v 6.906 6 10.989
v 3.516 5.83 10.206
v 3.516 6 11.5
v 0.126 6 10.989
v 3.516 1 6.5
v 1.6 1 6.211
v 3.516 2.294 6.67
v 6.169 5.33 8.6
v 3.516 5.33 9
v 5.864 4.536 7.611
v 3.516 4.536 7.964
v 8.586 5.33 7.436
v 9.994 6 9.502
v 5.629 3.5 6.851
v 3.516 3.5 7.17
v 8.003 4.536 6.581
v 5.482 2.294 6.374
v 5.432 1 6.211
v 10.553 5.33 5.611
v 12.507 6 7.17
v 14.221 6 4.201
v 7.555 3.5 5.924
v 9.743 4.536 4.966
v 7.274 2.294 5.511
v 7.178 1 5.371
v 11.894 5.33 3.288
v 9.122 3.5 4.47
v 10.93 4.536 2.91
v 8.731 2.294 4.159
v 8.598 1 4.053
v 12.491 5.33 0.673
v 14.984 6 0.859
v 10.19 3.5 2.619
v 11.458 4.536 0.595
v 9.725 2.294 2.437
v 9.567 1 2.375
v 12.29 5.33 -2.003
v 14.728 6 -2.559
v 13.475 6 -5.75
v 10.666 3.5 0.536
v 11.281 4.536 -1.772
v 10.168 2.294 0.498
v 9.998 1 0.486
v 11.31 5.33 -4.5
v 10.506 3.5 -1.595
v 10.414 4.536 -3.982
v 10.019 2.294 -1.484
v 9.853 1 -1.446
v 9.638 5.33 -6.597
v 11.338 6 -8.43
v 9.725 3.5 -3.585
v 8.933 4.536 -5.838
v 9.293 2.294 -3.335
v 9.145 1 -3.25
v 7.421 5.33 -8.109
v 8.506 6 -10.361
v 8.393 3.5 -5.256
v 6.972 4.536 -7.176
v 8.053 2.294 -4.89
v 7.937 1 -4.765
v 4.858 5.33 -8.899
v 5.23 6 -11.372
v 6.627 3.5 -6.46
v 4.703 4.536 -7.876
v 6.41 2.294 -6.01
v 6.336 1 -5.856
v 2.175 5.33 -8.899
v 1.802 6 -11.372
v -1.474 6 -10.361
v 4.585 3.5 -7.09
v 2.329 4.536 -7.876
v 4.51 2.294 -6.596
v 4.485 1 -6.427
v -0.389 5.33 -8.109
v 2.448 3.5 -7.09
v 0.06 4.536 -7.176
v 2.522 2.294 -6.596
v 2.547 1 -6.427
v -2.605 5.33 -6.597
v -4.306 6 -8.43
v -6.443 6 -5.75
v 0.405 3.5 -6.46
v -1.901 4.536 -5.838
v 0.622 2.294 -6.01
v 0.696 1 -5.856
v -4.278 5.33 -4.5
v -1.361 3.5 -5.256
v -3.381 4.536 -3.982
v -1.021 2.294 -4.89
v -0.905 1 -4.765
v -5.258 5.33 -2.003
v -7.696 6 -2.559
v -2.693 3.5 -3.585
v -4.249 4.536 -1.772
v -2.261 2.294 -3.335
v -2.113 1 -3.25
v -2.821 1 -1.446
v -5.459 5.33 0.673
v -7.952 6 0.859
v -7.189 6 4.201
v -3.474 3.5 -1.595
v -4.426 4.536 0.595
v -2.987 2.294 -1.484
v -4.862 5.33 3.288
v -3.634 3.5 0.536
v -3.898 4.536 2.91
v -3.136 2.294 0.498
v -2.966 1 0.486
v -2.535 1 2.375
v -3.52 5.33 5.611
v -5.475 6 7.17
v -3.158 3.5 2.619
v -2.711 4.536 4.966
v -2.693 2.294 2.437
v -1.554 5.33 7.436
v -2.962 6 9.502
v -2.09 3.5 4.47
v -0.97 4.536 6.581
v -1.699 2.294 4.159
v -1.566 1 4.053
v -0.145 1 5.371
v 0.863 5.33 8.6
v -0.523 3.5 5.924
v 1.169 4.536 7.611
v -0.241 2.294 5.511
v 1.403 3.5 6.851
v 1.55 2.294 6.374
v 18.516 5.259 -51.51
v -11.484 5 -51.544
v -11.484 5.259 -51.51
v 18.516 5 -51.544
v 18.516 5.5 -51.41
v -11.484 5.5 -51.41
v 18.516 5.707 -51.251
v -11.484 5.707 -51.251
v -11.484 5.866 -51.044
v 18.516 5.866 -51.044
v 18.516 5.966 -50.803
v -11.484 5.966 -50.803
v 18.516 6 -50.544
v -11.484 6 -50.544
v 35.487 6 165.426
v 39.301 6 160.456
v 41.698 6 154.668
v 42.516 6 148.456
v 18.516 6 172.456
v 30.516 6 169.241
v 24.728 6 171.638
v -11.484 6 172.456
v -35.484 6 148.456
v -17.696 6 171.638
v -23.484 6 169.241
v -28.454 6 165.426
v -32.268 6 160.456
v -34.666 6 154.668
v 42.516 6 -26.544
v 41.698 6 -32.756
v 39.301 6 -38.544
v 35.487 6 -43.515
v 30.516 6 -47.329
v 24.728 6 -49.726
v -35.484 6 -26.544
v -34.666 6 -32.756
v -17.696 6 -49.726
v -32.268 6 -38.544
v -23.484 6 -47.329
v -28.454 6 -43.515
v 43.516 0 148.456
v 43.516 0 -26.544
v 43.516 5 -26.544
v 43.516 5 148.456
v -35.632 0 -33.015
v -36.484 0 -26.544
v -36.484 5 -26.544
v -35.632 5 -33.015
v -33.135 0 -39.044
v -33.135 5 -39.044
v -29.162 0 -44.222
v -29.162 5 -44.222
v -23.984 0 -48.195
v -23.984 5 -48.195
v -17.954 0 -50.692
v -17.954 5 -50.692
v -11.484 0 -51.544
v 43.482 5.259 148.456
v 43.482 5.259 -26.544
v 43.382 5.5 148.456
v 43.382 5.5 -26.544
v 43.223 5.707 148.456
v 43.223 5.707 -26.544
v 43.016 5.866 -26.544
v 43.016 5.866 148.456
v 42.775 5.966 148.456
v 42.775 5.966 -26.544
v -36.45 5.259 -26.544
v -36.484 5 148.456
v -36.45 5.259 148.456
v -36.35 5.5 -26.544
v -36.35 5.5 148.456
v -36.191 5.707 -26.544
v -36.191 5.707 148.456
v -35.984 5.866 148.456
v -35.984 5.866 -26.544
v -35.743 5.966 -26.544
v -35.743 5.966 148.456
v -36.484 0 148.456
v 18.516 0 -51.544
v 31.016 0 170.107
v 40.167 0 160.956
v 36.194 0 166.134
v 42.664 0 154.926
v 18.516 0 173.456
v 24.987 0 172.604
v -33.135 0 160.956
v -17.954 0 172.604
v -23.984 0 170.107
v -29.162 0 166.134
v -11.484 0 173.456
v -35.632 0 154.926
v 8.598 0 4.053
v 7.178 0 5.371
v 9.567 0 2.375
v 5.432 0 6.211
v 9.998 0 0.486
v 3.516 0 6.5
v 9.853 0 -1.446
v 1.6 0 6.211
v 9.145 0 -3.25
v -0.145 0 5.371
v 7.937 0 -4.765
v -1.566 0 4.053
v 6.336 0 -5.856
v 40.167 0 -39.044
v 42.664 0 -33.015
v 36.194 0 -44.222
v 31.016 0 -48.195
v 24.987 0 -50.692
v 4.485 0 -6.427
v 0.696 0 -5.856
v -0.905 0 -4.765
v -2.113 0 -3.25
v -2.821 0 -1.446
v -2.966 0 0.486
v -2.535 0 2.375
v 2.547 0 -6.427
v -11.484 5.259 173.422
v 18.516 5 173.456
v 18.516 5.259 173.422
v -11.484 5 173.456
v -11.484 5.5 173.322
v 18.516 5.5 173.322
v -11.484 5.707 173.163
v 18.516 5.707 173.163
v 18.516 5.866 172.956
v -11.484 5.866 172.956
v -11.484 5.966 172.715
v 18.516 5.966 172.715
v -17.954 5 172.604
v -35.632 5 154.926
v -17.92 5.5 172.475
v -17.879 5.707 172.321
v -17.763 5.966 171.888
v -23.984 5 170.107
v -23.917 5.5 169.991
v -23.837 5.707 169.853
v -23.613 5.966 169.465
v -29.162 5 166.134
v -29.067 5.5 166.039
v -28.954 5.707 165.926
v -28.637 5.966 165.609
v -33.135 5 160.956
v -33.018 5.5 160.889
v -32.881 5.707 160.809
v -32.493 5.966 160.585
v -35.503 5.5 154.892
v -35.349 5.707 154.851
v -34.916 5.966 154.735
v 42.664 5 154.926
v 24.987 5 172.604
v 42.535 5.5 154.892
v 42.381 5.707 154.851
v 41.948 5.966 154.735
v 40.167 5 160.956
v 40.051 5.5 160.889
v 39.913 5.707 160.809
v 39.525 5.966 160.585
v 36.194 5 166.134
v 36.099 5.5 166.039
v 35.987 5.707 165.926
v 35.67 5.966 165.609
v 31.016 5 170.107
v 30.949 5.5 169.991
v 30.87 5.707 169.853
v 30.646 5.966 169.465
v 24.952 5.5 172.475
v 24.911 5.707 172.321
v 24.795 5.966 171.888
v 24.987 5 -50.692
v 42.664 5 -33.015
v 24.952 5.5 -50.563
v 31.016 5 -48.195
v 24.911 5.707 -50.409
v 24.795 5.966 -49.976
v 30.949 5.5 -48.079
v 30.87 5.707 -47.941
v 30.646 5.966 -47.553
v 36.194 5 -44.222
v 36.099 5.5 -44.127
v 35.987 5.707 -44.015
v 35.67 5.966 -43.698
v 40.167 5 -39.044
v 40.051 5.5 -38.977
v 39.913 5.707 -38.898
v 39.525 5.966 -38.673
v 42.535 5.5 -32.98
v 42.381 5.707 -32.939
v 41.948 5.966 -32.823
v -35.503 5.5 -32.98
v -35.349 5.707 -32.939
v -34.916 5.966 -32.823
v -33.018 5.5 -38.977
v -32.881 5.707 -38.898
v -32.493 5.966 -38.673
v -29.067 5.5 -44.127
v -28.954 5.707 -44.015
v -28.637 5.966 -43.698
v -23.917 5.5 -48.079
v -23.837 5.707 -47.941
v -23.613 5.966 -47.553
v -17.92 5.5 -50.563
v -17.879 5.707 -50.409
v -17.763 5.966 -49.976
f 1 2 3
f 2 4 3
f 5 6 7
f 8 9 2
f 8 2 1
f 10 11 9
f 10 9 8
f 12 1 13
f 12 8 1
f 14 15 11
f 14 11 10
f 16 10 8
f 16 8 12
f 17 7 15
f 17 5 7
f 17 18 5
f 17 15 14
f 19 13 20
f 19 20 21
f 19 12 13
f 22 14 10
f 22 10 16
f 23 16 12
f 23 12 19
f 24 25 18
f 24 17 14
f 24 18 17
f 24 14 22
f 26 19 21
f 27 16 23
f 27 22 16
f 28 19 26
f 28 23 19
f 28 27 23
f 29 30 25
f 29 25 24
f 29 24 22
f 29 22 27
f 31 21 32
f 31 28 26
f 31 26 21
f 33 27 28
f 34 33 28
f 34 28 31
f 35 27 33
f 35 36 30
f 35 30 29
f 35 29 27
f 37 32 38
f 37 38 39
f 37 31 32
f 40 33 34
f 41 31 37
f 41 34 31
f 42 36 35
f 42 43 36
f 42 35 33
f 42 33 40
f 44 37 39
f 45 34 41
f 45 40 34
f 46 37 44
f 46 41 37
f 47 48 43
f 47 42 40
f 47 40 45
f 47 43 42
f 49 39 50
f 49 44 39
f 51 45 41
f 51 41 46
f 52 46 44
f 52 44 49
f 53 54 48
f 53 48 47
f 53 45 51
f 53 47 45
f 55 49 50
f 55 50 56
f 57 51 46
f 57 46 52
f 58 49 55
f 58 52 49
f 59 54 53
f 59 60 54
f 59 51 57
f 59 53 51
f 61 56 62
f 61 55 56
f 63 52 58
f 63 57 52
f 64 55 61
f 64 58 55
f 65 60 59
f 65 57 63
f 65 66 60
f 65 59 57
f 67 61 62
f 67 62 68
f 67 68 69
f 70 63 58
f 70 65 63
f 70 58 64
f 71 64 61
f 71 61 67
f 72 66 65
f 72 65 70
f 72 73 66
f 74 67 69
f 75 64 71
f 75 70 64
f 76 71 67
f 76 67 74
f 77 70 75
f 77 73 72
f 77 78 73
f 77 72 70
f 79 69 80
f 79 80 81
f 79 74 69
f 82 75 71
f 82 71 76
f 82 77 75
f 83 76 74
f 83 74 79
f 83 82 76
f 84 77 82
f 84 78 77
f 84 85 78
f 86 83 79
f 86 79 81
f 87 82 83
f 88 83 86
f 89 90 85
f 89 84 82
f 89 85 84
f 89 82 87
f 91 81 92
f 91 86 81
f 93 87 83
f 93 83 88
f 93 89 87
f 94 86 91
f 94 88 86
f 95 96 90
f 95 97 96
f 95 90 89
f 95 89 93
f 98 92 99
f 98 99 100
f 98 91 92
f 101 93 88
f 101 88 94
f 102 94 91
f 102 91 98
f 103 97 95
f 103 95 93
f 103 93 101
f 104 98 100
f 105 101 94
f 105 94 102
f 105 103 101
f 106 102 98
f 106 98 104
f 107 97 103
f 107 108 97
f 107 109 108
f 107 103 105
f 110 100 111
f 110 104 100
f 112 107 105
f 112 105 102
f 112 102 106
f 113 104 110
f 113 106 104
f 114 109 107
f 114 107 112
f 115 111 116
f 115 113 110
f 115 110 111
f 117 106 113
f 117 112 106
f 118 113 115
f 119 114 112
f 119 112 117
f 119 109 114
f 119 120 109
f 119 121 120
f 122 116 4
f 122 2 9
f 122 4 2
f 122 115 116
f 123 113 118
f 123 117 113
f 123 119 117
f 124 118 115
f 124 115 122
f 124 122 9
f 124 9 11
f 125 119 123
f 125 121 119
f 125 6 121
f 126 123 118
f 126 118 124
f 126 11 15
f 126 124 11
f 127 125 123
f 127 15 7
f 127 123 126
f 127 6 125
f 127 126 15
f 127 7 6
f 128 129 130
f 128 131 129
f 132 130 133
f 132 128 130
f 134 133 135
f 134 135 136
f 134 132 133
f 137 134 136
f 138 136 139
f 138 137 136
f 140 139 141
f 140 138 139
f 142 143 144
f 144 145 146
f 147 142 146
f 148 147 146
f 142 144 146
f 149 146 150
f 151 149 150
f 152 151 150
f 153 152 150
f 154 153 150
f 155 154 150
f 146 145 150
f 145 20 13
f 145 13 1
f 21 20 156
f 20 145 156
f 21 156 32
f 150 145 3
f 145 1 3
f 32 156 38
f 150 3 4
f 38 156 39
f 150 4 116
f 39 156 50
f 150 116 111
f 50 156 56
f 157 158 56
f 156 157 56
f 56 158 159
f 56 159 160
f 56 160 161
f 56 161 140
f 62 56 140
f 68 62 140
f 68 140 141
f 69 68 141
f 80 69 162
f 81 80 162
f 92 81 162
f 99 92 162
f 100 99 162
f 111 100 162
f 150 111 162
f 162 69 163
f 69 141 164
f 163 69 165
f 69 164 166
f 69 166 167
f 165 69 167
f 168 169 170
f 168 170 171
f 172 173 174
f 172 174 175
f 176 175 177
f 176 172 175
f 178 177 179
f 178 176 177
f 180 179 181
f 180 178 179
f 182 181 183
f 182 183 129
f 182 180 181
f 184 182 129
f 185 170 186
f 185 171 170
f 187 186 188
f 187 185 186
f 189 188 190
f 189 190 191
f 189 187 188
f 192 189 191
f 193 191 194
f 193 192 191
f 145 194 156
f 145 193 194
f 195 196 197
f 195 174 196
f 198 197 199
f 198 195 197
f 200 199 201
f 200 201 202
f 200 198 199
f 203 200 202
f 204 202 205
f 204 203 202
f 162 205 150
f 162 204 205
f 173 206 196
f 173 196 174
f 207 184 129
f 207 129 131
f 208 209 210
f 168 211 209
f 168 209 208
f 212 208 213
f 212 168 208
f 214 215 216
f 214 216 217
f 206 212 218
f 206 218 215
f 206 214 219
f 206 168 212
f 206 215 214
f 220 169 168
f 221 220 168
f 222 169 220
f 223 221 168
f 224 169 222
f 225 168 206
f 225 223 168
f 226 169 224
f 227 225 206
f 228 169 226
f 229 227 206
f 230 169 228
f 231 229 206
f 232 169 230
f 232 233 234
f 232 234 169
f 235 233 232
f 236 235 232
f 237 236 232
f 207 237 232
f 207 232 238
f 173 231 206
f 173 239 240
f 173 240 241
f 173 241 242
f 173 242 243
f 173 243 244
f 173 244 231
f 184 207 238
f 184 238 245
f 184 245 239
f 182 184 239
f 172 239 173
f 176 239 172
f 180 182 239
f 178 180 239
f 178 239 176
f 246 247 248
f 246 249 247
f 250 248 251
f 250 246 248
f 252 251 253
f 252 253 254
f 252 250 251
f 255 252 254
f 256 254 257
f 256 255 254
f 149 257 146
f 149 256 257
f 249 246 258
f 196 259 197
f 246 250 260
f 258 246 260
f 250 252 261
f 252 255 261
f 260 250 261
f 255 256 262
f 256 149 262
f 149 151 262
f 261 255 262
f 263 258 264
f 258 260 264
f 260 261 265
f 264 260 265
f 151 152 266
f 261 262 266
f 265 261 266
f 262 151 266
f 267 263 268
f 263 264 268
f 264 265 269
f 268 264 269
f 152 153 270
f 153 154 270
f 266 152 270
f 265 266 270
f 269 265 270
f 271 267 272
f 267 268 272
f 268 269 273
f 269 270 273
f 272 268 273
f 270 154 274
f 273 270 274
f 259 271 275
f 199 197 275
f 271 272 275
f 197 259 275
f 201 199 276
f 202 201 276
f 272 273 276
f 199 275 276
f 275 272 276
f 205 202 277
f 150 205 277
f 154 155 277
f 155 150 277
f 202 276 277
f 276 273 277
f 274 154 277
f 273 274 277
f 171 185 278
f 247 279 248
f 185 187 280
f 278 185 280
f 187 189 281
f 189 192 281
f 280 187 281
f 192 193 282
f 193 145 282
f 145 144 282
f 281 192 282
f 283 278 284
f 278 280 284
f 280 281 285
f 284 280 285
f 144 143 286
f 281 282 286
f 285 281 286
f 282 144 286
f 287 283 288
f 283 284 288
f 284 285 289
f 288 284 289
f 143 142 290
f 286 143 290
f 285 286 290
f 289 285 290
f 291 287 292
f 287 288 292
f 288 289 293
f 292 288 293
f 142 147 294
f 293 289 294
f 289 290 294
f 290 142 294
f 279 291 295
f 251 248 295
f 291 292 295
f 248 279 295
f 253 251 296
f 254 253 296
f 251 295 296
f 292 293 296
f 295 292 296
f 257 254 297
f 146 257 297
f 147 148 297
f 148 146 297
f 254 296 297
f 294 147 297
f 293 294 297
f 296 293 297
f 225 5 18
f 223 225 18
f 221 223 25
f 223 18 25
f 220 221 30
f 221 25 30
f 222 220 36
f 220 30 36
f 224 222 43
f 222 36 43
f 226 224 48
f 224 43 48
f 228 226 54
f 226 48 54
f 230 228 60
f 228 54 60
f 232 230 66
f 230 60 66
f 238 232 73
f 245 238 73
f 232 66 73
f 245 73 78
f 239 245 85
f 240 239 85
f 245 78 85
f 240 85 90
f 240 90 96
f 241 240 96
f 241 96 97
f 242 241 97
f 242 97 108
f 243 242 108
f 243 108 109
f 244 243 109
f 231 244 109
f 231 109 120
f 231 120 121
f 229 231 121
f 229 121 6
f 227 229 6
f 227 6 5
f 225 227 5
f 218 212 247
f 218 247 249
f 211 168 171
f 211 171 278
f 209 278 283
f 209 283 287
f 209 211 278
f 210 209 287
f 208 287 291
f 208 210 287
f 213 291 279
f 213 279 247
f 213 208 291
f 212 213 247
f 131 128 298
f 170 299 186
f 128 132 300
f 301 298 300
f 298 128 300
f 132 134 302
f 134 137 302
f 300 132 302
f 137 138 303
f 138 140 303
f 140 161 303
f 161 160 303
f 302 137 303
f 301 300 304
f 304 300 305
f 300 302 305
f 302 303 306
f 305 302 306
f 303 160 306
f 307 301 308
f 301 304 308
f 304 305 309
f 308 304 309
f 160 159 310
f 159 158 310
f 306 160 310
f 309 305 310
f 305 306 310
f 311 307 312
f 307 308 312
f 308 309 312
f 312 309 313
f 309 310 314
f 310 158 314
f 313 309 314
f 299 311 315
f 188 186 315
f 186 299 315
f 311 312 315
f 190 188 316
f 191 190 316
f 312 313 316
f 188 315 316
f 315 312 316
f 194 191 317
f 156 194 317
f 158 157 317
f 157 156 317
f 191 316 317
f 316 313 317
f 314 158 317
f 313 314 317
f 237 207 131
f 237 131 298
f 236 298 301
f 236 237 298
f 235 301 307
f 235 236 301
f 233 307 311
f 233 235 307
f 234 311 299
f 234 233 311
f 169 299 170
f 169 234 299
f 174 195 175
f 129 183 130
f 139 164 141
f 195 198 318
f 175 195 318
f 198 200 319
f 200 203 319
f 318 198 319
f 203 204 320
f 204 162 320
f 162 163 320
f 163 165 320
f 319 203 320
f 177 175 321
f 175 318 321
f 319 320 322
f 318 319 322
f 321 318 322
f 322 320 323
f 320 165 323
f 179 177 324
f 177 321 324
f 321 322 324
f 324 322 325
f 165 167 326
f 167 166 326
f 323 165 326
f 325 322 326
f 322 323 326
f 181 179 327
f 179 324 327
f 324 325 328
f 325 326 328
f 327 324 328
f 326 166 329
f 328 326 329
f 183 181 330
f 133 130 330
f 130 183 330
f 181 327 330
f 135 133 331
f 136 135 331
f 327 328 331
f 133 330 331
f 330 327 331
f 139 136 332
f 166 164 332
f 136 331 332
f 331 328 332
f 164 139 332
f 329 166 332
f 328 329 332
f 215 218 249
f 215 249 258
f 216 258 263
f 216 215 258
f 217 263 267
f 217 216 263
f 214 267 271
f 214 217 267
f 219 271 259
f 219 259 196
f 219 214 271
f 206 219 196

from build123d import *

# Parameters (mm, degrees)
EXTRUDE_1_DEPTH     = 6
FILLET_1_R          = 1
SKETCH_2_R          = 6.5
CUT_EXTRUDE_1_DEPTH = 179.931854445
FILLET_2_R          = 5


with BuildPart() as part:
    # 草图1 → 凸台-拉伸1 (new body)
    with BuildSketch(Plane(origin=(0, 0, 0), x_dir=(1, 0, 0), z_dir=(0, 1, 0))):
        with BuildLine():
            Line((-11.483876828, 51.544081798), (18.516123172, 51.544081798))
            ThreePointArc((18.516123172, 51.544081798), (36.193792702, 44.221751328), (43.516123172, 26.544081798))
            Line((43.516123172, 26.544081798), (43.516123172, -148.455918202))
            ThreePointArc((43.516123172, -148.455918202), (36.193792702, -166.133587732), (18.516123172, -173.455918202))
            Line((18.516123172, -173.455918202), (-11.483876828, -173.455918202))
            ThreePointArc((-11.483876828, -173.455918202), (-29.161546358, -166.133587732), (-36.483876828, -148.455918202))
            Line((-36.483876828, -148.455918202), (-36.483876828, 26.544081798))
            ThreePointArc((-36.483876828, 26.544081798), (-29.161546358, 44.221751328), (-11.483876828, 51.544081798))
        make_face()
    extrude(amount=EXTRUDE_1_DEPTH)

    # 圆角1
    fillet_1_edges = [part.edges().sort_by_distance(p)[0] for p in [
        (36.193792702, 6, -44.221751328),
        (3.516123172, 6, -51.544081798),
        (-29.161546358, 6, -44.221751328),
        (-36.483876828, 6, 60.955918202),
        (-29.161546358, 6, 166.133587732),
        (3.516123172, 6, 173.455918202),
        (36.193792702, 6, 166.133587732),
        (43.516123172, 6, 60.955918202),
    ]]
    fillet(fillet_1_edges, radius=FILLET_1_R)

    # 草图2 → 切除-拉伸1 (cut, through all)
    with BuildSketch(Plane(origin=(0, 6, 0), x_dir=(1, 0, 0), z_dir=(0, 1, 0))):
        with Locations(Location((3.516123172, 0, 0), (0, 0, 270))):
            Circle(SKETCH_2_R)
    extrude(amount=-CUT_EXTRUDE_1_DEPTH, mode=Mode.SUBTRACT)

    # 圆角2
    fillet_2_edges = [part.edges().sort_by_distance(p)[0] for p in [
        (3.516123172, 6, -6.5),
    ]]
    fillet(fillet_2_edges, radius=FILLET_2_R)


solid = part.part
